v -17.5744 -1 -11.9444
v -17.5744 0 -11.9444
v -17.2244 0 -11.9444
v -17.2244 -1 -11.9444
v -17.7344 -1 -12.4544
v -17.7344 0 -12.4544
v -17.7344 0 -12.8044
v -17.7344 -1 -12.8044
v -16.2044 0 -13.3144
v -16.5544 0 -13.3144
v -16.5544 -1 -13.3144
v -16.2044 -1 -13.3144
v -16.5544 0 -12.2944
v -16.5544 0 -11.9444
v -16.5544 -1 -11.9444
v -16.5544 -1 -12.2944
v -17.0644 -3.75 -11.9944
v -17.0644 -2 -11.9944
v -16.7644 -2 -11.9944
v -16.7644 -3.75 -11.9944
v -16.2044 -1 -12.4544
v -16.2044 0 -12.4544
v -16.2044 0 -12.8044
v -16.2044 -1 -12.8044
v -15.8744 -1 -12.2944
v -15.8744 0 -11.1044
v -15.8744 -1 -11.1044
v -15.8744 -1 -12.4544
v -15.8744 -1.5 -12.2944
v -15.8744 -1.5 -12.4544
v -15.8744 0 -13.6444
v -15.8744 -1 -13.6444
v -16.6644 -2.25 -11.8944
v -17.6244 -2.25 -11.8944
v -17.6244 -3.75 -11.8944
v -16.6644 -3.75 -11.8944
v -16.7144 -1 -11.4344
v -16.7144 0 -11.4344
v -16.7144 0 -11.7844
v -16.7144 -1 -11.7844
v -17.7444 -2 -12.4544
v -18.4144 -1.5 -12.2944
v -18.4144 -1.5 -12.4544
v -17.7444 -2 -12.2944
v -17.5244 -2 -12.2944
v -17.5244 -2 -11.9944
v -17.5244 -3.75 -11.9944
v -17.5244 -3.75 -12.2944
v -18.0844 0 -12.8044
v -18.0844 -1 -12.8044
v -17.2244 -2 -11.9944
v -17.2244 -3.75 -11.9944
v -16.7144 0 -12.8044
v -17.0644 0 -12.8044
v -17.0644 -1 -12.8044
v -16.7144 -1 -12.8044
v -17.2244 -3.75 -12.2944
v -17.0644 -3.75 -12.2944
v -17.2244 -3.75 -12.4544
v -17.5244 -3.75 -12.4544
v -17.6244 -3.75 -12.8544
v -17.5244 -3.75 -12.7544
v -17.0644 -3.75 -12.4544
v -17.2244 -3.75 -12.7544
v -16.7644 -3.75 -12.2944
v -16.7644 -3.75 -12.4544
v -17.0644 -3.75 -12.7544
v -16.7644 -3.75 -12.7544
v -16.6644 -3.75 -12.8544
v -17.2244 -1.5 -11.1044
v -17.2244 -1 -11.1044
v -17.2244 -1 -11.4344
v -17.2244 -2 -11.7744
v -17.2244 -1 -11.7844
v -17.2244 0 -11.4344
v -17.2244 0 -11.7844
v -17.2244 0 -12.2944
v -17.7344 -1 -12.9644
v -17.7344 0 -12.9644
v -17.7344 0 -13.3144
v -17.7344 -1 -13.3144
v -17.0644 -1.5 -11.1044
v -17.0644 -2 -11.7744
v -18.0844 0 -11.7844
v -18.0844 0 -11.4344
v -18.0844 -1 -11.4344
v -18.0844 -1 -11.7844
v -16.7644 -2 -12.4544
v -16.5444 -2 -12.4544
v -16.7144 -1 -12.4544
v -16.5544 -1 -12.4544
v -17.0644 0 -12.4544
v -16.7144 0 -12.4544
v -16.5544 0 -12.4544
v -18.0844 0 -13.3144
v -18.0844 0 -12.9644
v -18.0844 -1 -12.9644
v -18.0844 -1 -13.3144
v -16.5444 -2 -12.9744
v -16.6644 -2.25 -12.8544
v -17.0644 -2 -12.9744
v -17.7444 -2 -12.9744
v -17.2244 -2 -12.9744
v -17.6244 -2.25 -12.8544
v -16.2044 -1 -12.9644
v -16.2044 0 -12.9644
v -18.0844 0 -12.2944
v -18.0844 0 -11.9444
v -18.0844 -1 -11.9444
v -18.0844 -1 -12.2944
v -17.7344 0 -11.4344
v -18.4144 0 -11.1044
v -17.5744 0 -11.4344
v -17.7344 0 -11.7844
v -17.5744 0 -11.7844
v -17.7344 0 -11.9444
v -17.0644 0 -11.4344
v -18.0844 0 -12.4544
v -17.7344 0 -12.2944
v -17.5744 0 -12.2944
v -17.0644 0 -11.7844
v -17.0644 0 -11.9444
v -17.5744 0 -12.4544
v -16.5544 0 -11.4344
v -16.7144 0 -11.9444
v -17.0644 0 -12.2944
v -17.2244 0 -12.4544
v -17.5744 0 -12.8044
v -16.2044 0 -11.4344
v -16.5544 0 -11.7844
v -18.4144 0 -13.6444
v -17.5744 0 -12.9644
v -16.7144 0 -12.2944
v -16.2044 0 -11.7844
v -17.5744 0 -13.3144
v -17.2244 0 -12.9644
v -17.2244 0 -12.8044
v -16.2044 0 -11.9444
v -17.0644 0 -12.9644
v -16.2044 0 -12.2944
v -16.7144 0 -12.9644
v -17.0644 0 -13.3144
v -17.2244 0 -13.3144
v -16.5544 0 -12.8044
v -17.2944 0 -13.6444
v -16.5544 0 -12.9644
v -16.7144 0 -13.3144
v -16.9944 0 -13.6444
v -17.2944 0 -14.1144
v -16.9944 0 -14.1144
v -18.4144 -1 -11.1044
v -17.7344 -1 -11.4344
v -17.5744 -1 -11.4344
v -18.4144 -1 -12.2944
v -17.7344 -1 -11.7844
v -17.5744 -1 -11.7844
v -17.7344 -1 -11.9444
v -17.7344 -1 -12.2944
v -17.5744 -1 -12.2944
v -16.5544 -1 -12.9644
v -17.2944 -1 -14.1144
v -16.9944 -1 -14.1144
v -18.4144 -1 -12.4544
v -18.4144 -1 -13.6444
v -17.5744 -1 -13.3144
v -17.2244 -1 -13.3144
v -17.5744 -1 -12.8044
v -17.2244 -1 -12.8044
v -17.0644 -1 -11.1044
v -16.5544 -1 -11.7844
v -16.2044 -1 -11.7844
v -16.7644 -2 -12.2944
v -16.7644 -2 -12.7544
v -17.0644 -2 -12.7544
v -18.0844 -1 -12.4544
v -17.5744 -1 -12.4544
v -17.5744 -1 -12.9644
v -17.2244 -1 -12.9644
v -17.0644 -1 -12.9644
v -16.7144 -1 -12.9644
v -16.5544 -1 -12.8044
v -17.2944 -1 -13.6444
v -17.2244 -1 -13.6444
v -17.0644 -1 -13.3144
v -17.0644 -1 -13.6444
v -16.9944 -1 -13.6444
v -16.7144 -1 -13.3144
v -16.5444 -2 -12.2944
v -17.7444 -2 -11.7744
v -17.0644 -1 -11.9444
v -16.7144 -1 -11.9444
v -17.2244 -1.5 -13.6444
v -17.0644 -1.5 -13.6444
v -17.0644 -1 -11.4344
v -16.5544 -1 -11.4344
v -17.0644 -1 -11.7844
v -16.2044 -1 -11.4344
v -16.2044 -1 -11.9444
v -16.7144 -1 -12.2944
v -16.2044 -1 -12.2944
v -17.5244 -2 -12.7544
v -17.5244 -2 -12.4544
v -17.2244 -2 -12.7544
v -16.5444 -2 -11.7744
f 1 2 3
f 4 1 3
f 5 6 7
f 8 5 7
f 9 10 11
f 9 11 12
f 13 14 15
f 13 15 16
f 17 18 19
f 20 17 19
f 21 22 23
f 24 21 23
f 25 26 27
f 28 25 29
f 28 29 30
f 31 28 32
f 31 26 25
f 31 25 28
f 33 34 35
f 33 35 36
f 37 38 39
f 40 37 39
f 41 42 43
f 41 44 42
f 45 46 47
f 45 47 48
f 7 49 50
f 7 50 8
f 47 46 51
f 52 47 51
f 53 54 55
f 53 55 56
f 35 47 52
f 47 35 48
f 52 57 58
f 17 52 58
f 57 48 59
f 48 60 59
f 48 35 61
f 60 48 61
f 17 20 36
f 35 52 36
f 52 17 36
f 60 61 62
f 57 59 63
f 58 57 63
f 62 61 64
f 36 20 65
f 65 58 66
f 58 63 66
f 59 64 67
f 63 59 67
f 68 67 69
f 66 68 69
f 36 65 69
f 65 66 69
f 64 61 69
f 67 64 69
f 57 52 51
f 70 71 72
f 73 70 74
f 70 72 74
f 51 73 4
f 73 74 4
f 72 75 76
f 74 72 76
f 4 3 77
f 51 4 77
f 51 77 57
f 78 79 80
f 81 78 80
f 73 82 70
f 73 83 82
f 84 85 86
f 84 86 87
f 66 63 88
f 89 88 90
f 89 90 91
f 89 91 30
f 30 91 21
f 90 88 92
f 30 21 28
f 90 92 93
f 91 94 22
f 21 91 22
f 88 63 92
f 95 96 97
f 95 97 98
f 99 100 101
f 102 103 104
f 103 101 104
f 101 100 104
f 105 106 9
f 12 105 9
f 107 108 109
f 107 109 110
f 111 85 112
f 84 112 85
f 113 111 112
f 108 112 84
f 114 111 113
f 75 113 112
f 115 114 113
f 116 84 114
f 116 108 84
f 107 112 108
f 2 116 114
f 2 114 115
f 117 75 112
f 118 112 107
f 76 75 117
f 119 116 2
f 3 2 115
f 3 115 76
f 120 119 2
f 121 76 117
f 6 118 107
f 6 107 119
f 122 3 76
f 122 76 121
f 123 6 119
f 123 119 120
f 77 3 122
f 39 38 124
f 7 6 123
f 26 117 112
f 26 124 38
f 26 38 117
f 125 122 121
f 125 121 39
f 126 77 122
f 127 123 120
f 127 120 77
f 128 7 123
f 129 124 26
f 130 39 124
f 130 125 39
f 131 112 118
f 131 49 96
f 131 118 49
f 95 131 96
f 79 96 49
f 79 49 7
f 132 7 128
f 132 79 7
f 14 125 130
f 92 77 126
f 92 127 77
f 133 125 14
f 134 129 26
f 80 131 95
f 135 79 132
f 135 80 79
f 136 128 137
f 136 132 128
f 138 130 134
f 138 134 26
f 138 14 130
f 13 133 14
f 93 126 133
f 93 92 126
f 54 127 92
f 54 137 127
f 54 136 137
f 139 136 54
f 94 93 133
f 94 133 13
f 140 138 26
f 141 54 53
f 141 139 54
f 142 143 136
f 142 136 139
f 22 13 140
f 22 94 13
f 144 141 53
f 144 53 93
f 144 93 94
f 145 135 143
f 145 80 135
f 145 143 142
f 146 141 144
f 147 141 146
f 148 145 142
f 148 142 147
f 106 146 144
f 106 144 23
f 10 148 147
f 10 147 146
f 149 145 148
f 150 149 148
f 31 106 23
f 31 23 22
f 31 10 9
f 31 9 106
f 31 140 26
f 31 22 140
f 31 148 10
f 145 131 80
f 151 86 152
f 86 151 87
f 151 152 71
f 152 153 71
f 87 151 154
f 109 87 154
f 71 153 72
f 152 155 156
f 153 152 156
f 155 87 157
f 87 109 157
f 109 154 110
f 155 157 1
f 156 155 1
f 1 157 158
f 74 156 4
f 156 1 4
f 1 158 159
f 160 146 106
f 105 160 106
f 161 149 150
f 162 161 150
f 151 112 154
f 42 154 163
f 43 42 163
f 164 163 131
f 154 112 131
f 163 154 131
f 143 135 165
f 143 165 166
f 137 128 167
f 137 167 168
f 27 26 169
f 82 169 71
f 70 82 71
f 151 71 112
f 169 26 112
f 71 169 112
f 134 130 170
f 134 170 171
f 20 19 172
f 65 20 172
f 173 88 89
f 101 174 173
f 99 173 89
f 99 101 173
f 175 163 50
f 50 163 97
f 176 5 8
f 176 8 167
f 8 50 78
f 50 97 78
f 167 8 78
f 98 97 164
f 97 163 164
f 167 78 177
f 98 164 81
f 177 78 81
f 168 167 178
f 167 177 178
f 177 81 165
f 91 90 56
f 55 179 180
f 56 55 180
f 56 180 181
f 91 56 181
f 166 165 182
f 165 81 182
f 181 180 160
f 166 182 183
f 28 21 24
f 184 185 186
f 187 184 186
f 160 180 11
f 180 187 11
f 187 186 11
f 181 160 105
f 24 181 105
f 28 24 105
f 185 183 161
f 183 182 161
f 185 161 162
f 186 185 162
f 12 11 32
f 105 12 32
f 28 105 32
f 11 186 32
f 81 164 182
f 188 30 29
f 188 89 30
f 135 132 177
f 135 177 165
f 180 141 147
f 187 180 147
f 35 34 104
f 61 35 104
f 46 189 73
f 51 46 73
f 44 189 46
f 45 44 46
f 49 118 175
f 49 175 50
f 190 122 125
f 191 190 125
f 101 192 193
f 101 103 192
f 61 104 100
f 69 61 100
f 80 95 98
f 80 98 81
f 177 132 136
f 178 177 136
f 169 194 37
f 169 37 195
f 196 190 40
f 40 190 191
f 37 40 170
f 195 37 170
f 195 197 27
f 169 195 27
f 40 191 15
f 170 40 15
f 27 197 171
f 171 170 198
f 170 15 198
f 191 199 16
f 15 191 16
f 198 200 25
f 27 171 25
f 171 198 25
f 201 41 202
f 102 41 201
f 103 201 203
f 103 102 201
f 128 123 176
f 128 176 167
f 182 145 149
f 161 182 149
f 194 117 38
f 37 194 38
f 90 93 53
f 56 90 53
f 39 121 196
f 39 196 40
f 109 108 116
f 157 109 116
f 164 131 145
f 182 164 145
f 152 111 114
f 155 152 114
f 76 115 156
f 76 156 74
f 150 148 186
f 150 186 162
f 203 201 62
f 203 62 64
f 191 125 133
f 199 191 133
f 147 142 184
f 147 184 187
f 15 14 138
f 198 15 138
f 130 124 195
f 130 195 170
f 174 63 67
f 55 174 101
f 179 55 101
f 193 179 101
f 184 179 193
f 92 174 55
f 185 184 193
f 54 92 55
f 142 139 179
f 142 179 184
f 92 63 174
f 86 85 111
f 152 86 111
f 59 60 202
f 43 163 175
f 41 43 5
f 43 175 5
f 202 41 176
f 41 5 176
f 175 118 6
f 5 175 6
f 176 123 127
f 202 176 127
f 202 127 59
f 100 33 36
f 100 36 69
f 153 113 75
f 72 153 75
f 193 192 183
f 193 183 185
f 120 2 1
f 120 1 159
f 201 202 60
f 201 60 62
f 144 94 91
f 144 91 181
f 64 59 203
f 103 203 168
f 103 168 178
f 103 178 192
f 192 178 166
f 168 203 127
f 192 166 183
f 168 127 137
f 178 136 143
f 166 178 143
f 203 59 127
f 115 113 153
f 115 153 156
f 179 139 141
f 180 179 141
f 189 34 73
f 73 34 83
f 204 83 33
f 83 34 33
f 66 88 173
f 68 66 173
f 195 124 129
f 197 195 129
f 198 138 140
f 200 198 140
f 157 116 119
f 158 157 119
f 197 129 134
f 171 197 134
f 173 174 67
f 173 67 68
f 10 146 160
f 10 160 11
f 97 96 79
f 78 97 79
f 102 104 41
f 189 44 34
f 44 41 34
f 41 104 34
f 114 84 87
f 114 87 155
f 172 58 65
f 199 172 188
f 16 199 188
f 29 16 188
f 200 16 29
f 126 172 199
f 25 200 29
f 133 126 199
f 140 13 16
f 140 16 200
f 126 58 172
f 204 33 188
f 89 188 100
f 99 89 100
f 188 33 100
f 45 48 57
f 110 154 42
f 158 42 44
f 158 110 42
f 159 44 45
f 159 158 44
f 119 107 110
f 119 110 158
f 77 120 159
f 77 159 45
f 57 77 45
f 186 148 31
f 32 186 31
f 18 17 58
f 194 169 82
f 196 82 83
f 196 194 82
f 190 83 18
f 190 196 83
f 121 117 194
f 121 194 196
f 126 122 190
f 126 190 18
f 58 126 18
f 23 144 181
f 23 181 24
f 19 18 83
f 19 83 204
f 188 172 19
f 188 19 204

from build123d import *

# Parameters (mm, degrees)
TOP_PANEL_W               = 2.54
TOP_PANEL_H               = 2.54
BOSS_EXTRUDE1_DEPTH       = 1
WELL_HOLES_W              = 0.35
WELL_HOLES_H              = 0.35
WELLS_DEPTH               = 1
SKETCH5_W                 = 2.54
SKETCH5_H                 = 0.16
BOSS_EXTRUDE5_DEPTH       = 0.5
SKETCH4_W                 = 1.2
SKETCH4_H                 = 0.16
SUPPORT_WALL_SKETCH_W     = 0.16
SUPPORT_WALL_SKETCH_H     = 2.54
BOSS_EXTRUDE7_DEPTH       = 0.5
SKETCH7_W                 = 0.16
SKETCH7_H                 = 0.52
SKETCH7_3_W               = 0.16
SKETCH7_3_H               = 0.52
SKETCH8_W                 = 1.2
SKETCH8_H                 = 1.2
SKETCH9_W                 = 0.96
SKETCH9_H                 = 0.96
SKETCH9_2_W               = 0.96
SKETCH9_2_H               = 0.96
TETRODE_GUIDE_DEPTH       = 1.5
TETRODE_ENTRY_HOLDES_W    = 0.3
TETRODE_ENTRY_HOLDES_H    = 0.3
TETRODE_GUIDE_HOLES_DEPTH = 1.75
SKETCH10_W                = 0.3
SKETCH10_H                = 0.8
TAB_DEPTH                 = 1


with BuildPart() as part:
    # top_panel → Boss-Extrude1 (new body)
    with BuildSketch(Plane(origin=(0, 0, 0), x_dir=(1, 0, 0), z_dir=(0, 1, 0))):
        with Locations((-17.144369017, 12.374381862)):
            Rectangle(TOP_PANEL_W, TOP_PANEL_H)
    extrude(amount=-BOSS_EXTRUDE1_DEPTH)

    # well_holes → wells (cut)
    with BuildSketch(Plane(origin=(0, 0, 0), x_dir=(1, 0, 0), z_dir=(0, 1, 0))):
        with Locations((-17.399369017, 13.139381862)):
            Rectangle(WELL_HOLES_W, WELL_HOLES_H)
        with Locations((-17.909369017, 13.139381862)):
            Rectangle(WELL_HOLES_W, WELL_HOLES_H)
        with Locations((-16.889369017, 13.139381862)):
            Rectangle(WELL_HOLES_W, WELL_HOLES_H)
        with Locations((-16.379369017, 13.139381862)):
            Rectangle(WELL_HOLES_W, WELL_HOLES_H)
        with Locations((-17.399369017, 12.629381862)):
            Rectangle(WELL_HOLES_W, WELL_HOLES_H)
        with Locations((-16.889369017, 12.629381862)):
            Rectangle(WELL_HOLES_W, WELL_HOLES_H)
        with Locations((-16.379369017, 12.629381862)):
            Rectangle(WELL_HOLES_W, WELL_HOLES_H)
        with Locations((-17.399369017, 12.119381862)):
            Rectangle(WELL_HOLES_W, WELL_HOLES_H)
        with Locations((-16.889369017, 12.119381862)):
            Rectangle(WELL_HOLES_W, WELL_HOLES_H)
        with Locations((-16.379369017, 12.119381862)):
            Rectangle(WELL_HOLES_W, WELL_HOLES_H)
        with Locations((-17.399369017, 11.609381862)):
            Rectangle(WELL_HOLES_W, WELL_HOLES_H)
        with Locations((-16.889369017, 11.609381862)):
            Rectangle(WELL_HOLES_W, WELL_HOLES_H)
        with Locations((-16.379369017, 11.609381862)):
            Rectangle(WELL_HOLES_W, WELL_HOLES_H)
        with Locations((-17.909369017, 12.629381862)):
            Rectangle(WELL_HOLES_W, WELL_HOLES_H)
        with Locations((-17.909369017, 12.119381862)):
            Rectangle(WELL_HOLES_W, WELL_HOLES_H)
        with Locations((-17.909369017, 11.609381862)):
            Rectangle(WELL_HOLES_W, WELL_HOLES_H)
    extrude(amount=-WELLS_DEPTH, mode=Mode.SUBTRACT)

    # Sketch5 → Boss-Extrude5 (add)
    with BuildSketch(Plane(origin=(0, -1, 0), x_dir=(-1, 0, 0), z_dir=(0, -1, 0))):
        with Locations((17.144369017, 12.374381862)):
            Rectangle(SKETCH5_W, SKETCH5_H)
    extrude(amount=BOSS_EXTRUDE5_DEPTH)

    # Sketch4 → section 1 of loft3
    with BuildSketch(Plane(origin=(0, -2, 0), x_dir=(1, 0, 0), z_dir=(0, 1, 0)), mode=Mode.PRIVATE) as loft3_s1:
        with Locations((-17.144369017, 12.374381862)):
            Rectangle(SKETCH4_W, SKETCH4_H)
    # loft from a face of the part (loft3)
    loft([part.faces().sort_by_distance((-17.144369017, -1.5, -12.374381862))[0], loft3_s1.sketch])

    # support_wall_sketch → Boss-Extrude7 (add)
    with BuildSketch(Plane(origin=(0, -1, 0), x_dir=(-1, 0, 0), z_dir=(0, -1, 0))):
        with Locations((17.144369017, 12.374381862)):
            Rectangle(SUPPORT_WALL_SKETCH_W, SUPPORT_WALL_SKETCH_H)
    extrude(amount=BOSS_EXTRUDE7_DEPTH)

    # Sketch7 → section 1 of loft6
    with BuildSketch(Plane(origin=(0, -2, 0), x_dir=(1, 0, 0), z_dir=(0, 1, 0)), mode=Mode.PRIVATE) as loft6_s1:
        with Locations((-17.144369017, 12.034381862)):
            Rectangle(SKETCH7_W, SKETCH7_H)
    # loft from a face of the part (loft6)
    loft([part.faces().sort_by_distance((-17.144369017, -1.5, -11.699381862))[0], loft6_s1.sketch])

    # Sketch7<3> → section 1 of loft7
    with BuildSketch(Plane(origin=(0, -2, 0), x_dir=(1, 0, 0), z_dir=(0, 1, 0)), mode=Mode.PRIVATE) as loft7_s1:
        with Locations((-17.144369017, 12.714381862)):
            Rectangle(SKETCH7_3_W, SKETCH7_3_H)
    # loft from a face of the part (loft7)
    loft([part.faces().sort_by_distance((-17.144369017, -1.5, -13.049381862))[0], loft7_s1.sketch])

    # Sketch8 → mezzanine section 0
    with BuildSketch(Plane(origin=(0, -2, 0), x_dir=(1, 0, 0), z_dir=(0, 1, 0))):
        with Locations((-17.144369017, 12.374381862)):
            Rectangle(SKETCH8_W, SKETCH8_H)
    # Sketch9 → mezzanine section 1
    with BuildSketch(Plane(origin=(0, -2.25, 0), x_dir=(1, 0, 0), z_dir=(0, 1, 0))):
        with Locations((-17.144369017, 12.374381862)):
            Rectangle(SKETCH9_W, SKETCH9_H)
    loft()

    # Sketch9<2> → tetrode_guide (add)
    with BuildSketch(Plane(origin=(0, -2.25, 0), x_dir=(1, 0, 0), z_dir=(0, 1, 0))):
        with Locations((-17.144369017, 12.374381862)):
            Rectangle(SKETCH9_2_W, SKETCH9_2_H)
    extrude(amount=-TETRODE_GUIDE_DEPTH)

    # tetrode_entry_holdes → tetrode_guide_holes (cut)
    with BuildSketch(Plane(origin=(0, -2, 0), x_dir=(1, 0, 0), z_dir=(0, 1, 0))):
        with Locations((-17.374369017, 12.144381862)):
            Rectangle(TETRODE_ENTRY_HOLDES_W, TETRODE_ENTRY_HOLDES_H)
        with Locations((-16.914369017, 12.144381862)):
            Rectangle(TETRODE_ENTRY_HOLDES_W, TETRODE_ENTRY_HOLDES_H)
        with Locations((-16.914369017, 12.604381862)):
            Rectangle(TETRODE_ENTRY_HOLDES_W, TETRODE_ENTRY_HOLDES_H)
        with Locations((-17.374369017, 12.604381862)):
            Rectangle(TETRODE_ENTRY_HOLDES_W, TETRODE_ENTRY_HOLDES_H)
    extrude(amount=-TETRODE_GUIDE_HOLES_DEPTH, mode=Mode.SUBTRACT)

    # Sketch10 → tab (add)
    with BuildSketch(Plane(origin=(0, 0, 0), x_dir=(1, 0, 0), z_dir=(0, 1, 0))):
        with Locations((-17.144369017, 13.714381862)):
            Rectangle(SKETCH10_W, SKETCH10_H)
    extrude(amount=-TAB_DEPTH)


solid = part.part
